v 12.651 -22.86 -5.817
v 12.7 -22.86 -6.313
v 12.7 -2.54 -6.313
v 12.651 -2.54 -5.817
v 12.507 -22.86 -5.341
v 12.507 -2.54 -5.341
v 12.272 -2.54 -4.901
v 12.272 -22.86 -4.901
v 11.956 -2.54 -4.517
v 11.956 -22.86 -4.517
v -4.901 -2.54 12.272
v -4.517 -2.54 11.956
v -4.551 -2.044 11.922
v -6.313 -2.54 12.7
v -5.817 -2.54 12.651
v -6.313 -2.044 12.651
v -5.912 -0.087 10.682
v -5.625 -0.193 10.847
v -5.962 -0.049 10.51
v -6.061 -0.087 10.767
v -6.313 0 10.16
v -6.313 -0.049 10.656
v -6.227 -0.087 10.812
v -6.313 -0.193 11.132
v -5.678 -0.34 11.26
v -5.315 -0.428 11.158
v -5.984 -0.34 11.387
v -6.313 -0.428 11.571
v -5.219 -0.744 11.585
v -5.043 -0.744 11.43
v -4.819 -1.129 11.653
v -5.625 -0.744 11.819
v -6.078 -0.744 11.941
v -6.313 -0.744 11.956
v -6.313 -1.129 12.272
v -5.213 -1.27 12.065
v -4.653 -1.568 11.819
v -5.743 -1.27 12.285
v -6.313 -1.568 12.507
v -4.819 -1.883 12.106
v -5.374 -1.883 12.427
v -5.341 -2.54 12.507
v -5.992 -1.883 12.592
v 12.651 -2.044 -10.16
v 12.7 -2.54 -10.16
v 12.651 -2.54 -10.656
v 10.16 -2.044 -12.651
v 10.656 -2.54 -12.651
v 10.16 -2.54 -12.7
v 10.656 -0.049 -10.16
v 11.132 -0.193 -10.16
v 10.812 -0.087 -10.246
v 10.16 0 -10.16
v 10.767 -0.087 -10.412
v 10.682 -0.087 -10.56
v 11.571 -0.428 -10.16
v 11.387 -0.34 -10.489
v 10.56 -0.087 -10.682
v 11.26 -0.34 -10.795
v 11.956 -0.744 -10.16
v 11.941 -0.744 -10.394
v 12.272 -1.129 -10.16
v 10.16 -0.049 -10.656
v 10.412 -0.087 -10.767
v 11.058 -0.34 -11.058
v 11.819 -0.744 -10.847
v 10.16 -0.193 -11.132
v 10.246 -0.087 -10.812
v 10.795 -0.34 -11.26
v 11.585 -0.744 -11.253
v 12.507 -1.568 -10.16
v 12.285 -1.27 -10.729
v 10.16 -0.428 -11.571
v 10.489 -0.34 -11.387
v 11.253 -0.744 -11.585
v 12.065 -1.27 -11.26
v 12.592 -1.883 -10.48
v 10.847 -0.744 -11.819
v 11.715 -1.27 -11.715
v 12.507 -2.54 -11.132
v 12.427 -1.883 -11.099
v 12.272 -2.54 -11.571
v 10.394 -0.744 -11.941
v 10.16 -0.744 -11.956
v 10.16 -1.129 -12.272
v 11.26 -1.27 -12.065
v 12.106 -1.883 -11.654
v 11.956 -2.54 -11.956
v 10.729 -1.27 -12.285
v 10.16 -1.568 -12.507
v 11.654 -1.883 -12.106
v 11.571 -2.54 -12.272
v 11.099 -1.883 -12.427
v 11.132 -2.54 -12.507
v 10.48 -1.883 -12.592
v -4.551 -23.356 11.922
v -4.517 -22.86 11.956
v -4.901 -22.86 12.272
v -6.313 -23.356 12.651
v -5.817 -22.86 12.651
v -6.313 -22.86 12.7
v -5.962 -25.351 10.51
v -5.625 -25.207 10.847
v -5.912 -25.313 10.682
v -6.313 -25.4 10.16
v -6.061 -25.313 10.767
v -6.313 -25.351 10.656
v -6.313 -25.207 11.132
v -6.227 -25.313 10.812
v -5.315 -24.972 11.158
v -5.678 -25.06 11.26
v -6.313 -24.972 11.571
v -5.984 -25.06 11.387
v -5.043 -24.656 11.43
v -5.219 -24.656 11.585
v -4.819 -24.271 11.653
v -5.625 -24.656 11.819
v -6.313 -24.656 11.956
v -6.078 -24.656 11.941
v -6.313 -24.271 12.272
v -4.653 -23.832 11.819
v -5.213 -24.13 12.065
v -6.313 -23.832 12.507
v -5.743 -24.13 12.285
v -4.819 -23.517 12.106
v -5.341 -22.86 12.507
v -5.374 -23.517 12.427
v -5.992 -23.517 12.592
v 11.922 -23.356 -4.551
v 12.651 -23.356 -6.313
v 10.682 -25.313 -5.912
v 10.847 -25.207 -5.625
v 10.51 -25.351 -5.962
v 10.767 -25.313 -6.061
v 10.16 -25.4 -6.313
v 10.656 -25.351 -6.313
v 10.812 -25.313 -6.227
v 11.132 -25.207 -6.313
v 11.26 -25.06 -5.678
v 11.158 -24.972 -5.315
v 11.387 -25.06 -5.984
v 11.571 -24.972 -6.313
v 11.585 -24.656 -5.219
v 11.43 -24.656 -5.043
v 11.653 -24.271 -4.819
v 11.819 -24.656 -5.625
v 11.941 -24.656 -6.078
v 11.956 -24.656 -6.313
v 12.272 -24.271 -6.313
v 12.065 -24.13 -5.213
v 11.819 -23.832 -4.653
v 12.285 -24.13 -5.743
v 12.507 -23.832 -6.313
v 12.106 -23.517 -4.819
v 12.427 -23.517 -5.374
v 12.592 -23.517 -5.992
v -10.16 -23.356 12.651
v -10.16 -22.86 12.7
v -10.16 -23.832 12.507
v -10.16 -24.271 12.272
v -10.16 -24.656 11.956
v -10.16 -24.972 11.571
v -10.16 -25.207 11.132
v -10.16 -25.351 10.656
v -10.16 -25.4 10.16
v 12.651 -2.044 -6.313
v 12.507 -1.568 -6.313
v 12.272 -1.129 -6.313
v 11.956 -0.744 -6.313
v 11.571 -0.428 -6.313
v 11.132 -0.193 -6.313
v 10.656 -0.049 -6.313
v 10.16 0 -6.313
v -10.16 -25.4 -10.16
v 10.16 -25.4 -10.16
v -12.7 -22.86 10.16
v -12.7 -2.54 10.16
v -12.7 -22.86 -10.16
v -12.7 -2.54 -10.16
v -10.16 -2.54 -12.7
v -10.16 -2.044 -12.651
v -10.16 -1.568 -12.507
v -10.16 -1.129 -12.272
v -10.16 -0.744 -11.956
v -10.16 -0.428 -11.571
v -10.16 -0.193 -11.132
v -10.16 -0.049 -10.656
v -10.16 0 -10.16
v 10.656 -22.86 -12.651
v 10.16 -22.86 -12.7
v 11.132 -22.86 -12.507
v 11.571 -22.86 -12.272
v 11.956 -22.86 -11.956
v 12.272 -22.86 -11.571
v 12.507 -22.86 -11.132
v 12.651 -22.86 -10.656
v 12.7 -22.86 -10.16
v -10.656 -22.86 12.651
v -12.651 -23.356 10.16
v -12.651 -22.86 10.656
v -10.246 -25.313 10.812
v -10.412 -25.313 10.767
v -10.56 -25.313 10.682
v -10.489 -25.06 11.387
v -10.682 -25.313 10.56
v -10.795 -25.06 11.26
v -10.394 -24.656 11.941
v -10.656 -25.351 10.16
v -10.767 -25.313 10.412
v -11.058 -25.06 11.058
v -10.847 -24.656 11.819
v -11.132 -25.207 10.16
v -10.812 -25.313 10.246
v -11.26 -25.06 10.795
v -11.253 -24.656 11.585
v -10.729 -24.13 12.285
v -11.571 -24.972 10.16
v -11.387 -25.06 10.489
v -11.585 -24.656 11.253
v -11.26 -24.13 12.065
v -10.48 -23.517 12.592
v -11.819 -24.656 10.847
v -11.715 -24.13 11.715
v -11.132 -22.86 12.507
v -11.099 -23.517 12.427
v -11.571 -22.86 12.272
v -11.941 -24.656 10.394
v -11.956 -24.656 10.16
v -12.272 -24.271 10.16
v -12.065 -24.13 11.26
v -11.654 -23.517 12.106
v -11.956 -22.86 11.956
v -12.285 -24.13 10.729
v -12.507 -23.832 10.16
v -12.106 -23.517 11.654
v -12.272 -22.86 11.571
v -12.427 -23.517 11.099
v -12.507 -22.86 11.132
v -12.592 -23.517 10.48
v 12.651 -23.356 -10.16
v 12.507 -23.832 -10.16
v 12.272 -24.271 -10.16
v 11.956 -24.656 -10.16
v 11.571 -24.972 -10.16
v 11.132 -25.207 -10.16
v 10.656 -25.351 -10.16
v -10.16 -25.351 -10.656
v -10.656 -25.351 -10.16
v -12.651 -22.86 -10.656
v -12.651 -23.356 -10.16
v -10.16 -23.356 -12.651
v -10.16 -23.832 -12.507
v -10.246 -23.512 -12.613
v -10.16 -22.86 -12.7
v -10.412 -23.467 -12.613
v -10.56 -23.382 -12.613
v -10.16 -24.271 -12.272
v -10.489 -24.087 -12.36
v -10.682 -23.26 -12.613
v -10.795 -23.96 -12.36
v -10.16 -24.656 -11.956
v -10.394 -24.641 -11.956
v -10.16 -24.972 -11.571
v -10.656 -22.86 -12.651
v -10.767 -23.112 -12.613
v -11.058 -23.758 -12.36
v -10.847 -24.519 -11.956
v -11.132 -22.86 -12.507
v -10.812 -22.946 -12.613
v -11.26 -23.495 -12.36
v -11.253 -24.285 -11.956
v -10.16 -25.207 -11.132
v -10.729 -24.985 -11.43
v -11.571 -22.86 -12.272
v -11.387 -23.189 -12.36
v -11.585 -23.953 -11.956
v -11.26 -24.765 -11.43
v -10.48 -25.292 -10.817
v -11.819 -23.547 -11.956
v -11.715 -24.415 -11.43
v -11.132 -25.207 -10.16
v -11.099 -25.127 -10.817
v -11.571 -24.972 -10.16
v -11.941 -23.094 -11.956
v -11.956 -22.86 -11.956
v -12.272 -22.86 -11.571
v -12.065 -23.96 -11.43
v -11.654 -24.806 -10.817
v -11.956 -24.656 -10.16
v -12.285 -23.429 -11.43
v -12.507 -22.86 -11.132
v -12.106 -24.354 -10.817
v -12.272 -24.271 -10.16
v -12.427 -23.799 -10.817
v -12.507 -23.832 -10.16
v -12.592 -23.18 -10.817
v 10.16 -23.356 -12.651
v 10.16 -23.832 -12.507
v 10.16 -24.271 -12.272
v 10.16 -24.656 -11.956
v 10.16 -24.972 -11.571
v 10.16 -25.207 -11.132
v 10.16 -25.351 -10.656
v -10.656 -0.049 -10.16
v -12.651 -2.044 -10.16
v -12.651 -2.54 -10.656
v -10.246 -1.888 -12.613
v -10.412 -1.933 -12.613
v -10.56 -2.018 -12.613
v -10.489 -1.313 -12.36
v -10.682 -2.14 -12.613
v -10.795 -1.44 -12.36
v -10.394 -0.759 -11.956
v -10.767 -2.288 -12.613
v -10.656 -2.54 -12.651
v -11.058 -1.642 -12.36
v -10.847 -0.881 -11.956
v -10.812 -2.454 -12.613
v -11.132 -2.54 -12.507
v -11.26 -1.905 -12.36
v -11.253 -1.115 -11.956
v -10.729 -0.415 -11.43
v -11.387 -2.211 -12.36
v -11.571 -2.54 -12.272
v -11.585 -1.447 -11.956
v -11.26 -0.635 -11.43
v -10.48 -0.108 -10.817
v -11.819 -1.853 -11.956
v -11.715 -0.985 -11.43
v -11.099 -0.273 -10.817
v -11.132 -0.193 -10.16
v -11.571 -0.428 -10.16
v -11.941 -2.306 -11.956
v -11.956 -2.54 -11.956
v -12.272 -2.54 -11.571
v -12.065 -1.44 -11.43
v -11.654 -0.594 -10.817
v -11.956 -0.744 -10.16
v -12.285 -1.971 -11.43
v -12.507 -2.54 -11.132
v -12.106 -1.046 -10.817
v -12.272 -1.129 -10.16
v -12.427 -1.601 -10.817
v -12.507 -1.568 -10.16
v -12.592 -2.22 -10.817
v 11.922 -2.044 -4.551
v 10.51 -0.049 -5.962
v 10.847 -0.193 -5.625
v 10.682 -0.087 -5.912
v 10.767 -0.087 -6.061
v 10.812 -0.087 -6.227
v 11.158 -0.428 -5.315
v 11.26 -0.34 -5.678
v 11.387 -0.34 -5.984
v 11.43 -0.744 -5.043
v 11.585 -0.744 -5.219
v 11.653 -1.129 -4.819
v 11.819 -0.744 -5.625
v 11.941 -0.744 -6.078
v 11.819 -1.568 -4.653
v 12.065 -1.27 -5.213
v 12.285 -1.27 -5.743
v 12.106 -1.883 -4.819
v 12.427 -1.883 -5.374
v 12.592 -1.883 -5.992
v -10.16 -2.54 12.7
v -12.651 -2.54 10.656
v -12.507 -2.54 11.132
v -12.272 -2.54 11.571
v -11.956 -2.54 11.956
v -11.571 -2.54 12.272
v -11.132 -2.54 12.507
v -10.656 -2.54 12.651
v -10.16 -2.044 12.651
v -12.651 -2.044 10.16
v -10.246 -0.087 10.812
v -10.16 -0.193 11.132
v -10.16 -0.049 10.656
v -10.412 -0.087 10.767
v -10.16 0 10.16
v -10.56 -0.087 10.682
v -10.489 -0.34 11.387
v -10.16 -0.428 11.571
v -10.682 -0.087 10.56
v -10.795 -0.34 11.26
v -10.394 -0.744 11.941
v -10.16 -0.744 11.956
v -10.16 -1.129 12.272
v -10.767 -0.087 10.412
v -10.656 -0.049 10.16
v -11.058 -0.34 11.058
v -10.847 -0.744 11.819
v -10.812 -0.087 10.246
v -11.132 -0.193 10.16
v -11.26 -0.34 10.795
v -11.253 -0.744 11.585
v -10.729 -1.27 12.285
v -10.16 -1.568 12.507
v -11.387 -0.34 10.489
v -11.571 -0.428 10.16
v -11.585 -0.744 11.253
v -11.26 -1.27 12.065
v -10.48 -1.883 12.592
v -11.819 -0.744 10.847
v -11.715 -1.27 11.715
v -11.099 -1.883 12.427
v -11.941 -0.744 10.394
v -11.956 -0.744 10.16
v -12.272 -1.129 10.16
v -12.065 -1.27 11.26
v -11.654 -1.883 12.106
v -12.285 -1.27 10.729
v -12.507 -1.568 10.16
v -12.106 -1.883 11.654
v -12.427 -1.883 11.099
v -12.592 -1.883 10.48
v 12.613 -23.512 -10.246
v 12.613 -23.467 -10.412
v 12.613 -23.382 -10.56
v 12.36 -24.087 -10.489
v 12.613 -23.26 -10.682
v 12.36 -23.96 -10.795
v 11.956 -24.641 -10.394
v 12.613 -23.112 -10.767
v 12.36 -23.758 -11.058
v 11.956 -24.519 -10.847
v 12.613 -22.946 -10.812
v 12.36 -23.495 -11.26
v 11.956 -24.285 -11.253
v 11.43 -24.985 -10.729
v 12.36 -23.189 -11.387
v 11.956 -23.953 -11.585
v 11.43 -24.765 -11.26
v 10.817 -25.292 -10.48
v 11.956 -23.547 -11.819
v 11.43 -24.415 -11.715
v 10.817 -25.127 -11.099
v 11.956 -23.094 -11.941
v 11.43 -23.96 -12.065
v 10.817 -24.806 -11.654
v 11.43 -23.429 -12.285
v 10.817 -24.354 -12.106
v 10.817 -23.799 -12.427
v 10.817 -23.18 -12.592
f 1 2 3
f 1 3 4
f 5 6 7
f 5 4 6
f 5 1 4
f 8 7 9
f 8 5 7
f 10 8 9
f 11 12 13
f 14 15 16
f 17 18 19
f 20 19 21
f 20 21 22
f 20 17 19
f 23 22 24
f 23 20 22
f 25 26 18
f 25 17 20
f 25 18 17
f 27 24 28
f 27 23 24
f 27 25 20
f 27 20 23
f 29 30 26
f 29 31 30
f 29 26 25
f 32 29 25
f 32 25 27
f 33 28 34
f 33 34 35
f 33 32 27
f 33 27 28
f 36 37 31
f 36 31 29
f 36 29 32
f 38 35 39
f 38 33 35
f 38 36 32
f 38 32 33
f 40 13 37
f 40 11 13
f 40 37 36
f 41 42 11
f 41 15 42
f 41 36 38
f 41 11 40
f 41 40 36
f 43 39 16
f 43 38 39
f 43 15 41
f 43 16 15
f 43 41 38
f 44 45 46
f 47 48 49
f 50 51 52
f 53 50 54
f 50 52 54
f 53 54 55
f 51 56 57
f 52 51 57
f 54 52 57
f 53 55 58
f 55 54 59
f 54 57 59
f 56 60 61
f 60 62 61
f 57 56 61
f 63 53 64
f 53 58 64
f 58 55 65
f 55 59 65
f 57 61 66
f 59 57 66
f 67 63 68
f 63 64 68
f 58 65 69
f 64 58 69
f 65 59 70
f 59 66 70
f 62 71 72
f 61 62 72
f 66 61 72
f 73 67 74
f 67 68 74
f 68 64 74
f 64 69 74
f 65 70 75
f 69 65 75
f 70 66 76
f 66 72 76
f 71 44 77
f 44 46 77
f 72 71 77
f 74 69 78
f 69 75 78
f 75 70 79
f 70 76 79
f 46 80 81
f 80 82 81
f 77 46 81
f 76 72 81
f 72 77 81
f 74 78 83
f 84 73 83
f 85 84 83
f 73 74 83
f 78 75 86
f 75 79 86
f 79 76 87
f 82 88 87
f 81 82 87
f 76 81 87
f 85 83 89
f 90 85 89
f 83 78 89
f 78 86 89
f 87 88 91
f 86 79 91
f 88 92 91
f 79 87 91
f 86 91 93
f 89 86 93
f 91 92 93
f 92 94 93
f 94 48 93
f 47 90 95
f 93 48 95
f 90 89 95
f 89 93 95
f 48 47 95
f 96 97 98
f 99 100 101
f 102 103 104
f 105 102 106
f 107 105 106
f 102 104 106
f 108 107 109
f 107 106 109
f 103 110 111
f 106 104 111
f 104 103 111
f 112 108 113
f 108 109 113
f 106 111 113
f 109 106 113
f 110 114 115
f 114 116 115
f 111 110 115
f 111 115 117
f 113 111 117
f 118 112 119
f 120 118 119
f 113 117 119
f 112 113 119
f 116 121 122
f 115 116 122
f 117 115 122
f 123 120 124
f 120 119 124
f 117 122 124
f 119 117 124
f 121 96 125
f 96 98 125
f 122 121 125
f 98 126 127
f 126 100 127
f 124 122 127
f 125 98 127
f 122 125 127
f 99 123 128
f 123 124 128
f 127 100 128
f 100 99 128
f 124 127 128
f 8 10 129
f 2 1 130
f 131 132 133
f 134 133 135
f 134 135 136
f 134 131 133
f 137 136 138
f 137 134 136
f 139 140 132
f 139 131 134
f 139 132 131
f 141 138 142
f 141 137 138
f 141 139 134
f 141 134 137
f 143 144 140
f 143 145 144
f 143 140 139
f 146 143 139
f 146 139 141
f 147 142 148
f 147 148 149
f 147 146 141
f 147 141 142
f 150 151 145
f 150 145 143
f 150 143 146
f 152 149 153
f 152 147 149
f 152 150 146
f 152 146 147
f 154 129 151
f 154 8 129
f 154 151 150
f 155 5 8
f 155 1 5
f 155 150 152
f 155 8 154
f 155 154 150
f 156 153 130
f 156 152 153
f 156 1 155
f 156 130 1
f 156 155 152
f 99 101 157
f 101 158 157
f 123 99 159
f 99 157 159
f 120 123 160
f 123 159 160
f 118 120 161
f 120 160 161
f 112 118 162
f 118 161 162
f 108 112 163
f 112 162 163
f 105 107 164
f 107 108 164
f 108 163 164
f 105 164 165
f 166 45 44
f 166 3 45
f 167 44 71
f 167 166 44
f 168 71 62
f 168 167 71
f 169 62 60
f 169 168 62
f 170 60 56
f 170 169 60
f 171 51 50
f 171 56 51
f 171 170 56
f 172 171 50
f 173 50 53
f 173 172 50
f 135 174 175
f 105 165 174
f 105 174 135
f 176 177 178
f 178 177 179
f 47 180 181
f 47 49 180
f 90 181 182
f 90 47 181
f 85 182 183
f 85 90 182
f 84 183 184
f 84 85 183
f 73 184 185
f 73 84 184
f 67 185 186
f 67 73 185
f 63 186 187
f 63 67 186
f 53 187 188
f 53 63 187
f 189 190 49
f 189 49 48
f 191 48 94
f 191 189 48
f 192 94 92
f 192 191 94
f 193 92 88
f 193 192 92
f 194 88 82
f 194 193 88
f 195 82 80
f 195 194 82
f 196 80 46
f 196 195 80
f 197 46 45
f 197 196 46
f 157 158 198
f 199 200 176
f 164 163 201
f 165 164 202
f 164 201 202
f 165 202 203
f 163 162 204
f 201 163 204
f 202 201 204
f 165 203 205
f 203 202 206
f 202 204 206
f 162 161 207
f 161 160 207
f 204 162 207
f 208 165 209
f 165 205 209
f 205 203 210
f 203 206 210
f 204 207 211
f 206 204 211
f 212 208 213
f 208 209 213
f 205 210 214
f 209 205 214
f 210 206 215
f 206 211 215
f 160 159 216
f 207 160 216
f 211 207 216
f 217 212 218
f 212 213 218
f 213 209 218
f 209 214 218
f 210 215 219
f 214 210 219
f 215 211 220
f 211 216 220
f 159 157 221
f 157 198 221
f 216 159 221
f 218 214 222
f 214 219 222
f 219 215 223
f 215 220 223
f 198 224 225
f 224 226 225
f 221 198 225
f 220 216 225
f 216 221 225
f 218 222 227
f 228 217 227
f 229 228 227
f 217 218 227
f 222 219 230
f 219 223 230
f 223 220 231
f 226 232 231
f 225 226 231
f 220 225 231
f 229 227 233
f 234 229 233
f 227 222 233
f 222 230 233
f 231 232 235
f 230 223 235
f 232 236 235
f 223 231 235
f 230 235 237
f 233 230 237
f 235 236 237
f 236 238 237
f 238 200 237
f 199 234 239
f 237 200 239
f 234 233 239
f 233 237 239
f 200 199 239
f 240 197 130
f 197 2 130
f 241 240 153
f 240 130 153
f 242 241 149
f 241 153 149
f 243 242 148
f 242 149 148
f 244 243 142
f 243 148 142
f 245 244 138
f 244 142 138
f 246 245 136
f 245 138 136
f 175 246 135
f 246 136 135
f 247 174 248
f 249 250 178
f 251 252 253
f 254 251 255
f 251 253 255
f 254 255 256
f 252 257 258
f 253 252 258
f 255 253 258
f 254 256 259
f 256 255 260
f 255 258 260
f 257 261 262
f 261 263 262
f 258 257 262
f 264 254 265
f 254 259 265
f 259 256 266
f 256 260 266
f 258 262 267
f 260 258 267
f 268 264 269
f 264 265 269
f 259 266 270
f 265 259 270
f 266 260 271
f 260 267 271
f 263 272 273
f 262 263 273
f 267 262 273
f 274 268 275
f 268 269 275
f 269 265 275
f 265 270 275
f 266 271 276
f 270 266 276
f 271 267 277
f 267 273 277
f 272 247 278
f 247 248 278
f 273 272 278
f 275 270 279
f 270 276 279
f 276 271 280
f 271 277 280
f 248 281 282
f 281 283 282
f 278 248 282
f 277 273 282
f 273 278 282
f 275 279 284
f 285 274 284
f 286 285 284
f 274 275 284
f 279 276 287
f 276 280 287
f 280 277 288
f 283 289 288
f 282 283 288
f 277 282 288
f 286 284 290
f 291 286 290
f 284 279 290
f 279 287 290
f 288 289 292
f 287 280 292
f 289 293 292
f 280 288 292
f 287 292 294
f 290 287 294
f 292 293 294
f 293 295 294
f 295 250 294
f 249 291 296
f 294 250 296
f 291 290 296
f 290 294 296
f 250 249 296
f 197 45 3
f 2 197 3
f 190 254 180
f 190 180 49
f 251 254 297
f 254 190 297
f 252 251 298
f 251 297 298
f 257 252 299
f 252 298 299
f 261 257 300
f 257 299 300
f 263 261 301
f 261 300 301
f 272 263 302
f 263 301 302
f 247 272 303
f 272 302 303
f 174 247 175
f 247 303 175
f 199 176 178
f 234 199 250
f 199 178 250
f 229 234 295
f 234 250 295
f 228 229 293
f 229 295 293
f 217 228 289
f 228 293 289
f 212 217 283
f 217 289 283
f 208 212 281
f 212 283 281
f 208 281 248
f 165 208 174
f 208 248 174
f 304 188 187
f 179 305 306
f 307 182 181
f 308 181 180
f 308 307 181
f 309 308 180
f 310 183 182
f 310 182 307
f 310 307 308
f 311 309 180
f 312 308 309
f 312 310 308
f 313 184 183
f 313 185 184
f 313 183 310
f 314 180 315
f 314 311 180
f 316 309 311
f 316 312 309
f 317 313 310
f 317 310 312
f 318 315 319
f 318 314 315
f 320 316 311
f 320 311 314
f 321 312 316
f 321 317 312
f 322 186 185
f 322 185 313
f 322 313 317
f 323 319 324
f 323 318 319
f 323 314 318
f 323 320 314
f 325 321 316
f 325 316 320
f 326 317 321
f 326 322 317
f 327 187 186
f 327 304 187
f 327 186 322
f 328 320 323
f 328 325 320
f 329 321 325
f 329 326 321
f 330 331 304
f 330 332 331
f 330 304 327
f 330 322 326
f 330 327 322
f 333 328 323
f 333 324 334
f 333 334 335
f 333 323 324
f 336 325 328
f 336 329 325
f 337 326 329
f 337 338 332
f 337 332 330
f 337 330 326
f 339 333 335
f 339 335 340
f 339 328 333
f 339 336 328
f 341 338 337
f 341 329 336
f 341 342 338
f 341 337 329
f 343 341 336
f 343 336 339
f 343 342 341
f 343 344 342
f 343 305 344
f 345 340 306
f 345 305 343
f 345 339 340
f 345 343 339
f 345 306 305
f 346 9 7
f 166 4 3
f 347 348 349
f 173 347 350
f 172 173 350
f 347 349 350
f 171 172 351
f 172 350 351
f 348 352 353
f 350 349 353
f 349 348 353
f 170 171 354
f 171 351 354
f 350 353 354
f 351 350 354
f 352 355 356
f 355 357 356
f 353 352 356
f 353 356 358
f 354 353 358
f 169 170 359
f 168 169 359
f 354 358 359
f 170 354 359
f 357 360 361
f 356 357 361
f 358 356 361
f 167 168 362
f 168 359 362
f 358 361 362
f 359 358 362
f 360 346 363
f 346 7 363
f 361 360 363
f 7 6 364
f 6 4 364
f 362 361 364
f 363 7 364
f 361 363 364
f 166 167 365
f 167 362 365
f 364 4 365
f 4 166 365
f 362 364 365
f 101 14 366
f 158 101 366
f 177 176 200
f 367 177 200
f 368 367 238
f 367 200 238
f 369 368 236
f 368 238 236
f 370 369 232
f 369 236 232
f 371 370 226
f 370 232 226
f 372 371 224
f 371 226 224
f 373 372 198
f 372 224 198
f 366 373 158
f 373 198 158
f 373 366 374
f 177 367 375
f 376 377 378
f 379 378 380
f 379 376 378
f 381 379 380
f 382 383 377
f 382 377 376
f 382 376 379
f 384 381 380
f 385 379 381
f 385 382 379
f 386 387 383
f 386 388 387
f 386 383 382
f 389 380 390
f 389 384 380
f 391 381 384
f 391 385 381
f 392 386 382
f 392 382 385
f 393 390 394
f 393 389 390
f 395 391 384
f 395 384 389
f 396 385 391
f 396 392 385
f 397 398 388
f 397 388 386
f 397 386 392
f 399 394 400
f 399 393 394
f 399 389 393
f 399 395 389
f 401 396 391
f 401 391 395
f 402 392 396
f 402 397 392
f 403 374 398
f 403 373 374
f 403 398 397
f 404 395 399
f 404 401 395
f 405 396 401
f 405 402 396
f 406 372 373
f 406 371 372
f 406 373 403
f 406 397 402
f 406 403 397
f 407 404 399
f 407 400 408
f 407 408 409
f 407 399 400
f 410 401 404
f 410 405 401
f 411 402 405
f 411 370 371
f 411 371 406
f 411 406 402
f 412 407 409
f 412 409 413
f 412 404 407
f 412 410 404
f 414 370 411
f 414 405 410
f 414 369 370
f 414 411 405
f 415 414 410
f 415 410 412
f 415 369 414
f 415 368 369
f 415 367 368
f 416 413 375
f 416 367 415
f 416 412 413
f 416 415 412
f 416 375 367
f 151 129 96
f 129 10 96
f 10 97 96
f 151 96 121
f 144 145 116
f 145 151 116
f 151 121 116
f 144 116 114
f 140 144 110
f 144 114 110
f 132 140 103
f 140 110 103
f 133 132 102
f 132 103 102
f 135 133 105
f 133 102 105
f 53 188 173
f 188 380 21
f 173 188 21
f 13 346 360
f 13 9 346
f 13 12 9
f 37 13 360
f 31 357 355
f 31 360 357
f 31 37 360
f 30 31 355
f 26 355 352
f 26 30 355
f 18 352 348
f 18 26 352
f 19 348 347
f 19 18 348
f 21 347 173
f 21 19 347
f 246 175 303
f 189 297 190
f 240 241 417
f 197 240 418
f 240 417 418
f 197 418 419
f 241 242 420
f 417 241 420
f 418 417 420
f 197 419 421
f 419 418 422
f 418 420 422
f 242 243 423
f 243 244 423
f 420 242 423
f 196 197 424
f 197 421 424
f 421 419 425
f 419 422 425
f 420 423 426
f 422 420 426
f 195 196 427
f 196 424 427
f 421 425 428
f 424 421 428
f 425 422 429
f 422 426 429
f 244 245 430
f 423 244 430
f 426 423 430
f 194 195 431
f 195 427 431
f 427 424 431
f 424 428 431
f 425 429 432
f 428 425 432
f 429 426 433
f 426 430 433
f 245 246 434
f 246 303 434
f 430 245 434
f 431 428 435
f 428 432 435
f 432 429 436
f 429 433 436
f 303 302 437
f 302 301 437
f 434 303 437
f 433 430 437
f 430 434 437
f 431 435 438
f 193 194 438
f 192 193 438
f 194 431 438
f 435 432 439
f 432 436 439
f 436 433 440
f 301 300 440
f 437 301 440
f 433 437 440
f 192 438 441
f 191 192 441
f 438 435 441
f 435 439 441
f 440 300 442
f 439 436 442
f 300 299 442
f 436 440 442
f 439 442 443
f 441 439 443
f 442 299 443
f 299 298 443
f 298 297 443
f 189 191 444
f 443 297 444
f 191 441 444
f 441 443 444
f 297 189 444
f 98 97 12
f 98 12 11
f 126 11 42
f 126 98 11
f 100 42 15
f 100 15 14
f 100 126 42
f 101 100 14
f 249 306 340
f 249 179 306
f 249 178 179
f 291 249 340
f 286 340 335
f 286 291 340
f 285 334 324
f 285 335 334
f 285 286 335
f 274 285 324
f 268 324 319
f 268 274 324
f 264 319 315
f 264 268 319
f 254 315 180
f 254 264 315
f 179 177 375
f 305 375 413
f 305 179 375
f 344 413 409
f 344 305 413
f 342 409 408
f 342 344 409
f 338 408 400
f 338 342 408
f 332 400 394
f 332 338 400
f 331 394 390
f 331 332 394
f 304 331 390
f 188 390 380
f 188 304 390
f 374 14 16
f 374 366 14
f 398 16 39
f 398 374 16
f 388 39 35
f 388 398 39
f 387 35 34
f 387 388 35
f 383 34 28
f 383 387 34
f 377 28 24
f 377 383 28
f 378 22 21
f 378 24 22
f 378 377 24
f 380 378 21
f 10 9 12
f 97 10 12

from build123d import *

# Parameters (mm, degrees)
F1_DEPTH = 25.4
F2_R     = 2.54


with BuildPart() as f1:
    # F0 (on Front) → F1 (new body)
    with BuildSketch(Plane.XZ):
        Polygon((-12.7, 12.7), (-12.7, -12.7), (12.7, -12.7), (12.7, -5.260512), (-5.260512, 12.7), align=None)
    extrude(amount=F1_DEPTH)

    # F2
    f2_edges = [f1.edges().sort_by_distance(p)[0] for p in [
        (-12.7, -12.7, 12.7),
        (12.7, -12.7, -5.260512),
        (-5.260512, -12.7, 12.7),
        (3.719744, 0, 3.719744),
        (3.719744, -25.4, 3.719744),
        (-8.980256, -25.4, 12.7),
        (-12.7, -25.4, 0),
        (0, -25.4, -12.7),
        (12.7, -25.4, -8.980256),
        (12.7, -12.7, -12.7),
        (12.7, 0, -8.980256),
        (-8.980256, 0, 12.7),
        (-12.7, 0, 0),
        (0, 0, -12.7),
        (-12.7, -12.7, -12.7),
    ]]
    fillet(f2_edges, radius=F2_R)


solid = f1.part
